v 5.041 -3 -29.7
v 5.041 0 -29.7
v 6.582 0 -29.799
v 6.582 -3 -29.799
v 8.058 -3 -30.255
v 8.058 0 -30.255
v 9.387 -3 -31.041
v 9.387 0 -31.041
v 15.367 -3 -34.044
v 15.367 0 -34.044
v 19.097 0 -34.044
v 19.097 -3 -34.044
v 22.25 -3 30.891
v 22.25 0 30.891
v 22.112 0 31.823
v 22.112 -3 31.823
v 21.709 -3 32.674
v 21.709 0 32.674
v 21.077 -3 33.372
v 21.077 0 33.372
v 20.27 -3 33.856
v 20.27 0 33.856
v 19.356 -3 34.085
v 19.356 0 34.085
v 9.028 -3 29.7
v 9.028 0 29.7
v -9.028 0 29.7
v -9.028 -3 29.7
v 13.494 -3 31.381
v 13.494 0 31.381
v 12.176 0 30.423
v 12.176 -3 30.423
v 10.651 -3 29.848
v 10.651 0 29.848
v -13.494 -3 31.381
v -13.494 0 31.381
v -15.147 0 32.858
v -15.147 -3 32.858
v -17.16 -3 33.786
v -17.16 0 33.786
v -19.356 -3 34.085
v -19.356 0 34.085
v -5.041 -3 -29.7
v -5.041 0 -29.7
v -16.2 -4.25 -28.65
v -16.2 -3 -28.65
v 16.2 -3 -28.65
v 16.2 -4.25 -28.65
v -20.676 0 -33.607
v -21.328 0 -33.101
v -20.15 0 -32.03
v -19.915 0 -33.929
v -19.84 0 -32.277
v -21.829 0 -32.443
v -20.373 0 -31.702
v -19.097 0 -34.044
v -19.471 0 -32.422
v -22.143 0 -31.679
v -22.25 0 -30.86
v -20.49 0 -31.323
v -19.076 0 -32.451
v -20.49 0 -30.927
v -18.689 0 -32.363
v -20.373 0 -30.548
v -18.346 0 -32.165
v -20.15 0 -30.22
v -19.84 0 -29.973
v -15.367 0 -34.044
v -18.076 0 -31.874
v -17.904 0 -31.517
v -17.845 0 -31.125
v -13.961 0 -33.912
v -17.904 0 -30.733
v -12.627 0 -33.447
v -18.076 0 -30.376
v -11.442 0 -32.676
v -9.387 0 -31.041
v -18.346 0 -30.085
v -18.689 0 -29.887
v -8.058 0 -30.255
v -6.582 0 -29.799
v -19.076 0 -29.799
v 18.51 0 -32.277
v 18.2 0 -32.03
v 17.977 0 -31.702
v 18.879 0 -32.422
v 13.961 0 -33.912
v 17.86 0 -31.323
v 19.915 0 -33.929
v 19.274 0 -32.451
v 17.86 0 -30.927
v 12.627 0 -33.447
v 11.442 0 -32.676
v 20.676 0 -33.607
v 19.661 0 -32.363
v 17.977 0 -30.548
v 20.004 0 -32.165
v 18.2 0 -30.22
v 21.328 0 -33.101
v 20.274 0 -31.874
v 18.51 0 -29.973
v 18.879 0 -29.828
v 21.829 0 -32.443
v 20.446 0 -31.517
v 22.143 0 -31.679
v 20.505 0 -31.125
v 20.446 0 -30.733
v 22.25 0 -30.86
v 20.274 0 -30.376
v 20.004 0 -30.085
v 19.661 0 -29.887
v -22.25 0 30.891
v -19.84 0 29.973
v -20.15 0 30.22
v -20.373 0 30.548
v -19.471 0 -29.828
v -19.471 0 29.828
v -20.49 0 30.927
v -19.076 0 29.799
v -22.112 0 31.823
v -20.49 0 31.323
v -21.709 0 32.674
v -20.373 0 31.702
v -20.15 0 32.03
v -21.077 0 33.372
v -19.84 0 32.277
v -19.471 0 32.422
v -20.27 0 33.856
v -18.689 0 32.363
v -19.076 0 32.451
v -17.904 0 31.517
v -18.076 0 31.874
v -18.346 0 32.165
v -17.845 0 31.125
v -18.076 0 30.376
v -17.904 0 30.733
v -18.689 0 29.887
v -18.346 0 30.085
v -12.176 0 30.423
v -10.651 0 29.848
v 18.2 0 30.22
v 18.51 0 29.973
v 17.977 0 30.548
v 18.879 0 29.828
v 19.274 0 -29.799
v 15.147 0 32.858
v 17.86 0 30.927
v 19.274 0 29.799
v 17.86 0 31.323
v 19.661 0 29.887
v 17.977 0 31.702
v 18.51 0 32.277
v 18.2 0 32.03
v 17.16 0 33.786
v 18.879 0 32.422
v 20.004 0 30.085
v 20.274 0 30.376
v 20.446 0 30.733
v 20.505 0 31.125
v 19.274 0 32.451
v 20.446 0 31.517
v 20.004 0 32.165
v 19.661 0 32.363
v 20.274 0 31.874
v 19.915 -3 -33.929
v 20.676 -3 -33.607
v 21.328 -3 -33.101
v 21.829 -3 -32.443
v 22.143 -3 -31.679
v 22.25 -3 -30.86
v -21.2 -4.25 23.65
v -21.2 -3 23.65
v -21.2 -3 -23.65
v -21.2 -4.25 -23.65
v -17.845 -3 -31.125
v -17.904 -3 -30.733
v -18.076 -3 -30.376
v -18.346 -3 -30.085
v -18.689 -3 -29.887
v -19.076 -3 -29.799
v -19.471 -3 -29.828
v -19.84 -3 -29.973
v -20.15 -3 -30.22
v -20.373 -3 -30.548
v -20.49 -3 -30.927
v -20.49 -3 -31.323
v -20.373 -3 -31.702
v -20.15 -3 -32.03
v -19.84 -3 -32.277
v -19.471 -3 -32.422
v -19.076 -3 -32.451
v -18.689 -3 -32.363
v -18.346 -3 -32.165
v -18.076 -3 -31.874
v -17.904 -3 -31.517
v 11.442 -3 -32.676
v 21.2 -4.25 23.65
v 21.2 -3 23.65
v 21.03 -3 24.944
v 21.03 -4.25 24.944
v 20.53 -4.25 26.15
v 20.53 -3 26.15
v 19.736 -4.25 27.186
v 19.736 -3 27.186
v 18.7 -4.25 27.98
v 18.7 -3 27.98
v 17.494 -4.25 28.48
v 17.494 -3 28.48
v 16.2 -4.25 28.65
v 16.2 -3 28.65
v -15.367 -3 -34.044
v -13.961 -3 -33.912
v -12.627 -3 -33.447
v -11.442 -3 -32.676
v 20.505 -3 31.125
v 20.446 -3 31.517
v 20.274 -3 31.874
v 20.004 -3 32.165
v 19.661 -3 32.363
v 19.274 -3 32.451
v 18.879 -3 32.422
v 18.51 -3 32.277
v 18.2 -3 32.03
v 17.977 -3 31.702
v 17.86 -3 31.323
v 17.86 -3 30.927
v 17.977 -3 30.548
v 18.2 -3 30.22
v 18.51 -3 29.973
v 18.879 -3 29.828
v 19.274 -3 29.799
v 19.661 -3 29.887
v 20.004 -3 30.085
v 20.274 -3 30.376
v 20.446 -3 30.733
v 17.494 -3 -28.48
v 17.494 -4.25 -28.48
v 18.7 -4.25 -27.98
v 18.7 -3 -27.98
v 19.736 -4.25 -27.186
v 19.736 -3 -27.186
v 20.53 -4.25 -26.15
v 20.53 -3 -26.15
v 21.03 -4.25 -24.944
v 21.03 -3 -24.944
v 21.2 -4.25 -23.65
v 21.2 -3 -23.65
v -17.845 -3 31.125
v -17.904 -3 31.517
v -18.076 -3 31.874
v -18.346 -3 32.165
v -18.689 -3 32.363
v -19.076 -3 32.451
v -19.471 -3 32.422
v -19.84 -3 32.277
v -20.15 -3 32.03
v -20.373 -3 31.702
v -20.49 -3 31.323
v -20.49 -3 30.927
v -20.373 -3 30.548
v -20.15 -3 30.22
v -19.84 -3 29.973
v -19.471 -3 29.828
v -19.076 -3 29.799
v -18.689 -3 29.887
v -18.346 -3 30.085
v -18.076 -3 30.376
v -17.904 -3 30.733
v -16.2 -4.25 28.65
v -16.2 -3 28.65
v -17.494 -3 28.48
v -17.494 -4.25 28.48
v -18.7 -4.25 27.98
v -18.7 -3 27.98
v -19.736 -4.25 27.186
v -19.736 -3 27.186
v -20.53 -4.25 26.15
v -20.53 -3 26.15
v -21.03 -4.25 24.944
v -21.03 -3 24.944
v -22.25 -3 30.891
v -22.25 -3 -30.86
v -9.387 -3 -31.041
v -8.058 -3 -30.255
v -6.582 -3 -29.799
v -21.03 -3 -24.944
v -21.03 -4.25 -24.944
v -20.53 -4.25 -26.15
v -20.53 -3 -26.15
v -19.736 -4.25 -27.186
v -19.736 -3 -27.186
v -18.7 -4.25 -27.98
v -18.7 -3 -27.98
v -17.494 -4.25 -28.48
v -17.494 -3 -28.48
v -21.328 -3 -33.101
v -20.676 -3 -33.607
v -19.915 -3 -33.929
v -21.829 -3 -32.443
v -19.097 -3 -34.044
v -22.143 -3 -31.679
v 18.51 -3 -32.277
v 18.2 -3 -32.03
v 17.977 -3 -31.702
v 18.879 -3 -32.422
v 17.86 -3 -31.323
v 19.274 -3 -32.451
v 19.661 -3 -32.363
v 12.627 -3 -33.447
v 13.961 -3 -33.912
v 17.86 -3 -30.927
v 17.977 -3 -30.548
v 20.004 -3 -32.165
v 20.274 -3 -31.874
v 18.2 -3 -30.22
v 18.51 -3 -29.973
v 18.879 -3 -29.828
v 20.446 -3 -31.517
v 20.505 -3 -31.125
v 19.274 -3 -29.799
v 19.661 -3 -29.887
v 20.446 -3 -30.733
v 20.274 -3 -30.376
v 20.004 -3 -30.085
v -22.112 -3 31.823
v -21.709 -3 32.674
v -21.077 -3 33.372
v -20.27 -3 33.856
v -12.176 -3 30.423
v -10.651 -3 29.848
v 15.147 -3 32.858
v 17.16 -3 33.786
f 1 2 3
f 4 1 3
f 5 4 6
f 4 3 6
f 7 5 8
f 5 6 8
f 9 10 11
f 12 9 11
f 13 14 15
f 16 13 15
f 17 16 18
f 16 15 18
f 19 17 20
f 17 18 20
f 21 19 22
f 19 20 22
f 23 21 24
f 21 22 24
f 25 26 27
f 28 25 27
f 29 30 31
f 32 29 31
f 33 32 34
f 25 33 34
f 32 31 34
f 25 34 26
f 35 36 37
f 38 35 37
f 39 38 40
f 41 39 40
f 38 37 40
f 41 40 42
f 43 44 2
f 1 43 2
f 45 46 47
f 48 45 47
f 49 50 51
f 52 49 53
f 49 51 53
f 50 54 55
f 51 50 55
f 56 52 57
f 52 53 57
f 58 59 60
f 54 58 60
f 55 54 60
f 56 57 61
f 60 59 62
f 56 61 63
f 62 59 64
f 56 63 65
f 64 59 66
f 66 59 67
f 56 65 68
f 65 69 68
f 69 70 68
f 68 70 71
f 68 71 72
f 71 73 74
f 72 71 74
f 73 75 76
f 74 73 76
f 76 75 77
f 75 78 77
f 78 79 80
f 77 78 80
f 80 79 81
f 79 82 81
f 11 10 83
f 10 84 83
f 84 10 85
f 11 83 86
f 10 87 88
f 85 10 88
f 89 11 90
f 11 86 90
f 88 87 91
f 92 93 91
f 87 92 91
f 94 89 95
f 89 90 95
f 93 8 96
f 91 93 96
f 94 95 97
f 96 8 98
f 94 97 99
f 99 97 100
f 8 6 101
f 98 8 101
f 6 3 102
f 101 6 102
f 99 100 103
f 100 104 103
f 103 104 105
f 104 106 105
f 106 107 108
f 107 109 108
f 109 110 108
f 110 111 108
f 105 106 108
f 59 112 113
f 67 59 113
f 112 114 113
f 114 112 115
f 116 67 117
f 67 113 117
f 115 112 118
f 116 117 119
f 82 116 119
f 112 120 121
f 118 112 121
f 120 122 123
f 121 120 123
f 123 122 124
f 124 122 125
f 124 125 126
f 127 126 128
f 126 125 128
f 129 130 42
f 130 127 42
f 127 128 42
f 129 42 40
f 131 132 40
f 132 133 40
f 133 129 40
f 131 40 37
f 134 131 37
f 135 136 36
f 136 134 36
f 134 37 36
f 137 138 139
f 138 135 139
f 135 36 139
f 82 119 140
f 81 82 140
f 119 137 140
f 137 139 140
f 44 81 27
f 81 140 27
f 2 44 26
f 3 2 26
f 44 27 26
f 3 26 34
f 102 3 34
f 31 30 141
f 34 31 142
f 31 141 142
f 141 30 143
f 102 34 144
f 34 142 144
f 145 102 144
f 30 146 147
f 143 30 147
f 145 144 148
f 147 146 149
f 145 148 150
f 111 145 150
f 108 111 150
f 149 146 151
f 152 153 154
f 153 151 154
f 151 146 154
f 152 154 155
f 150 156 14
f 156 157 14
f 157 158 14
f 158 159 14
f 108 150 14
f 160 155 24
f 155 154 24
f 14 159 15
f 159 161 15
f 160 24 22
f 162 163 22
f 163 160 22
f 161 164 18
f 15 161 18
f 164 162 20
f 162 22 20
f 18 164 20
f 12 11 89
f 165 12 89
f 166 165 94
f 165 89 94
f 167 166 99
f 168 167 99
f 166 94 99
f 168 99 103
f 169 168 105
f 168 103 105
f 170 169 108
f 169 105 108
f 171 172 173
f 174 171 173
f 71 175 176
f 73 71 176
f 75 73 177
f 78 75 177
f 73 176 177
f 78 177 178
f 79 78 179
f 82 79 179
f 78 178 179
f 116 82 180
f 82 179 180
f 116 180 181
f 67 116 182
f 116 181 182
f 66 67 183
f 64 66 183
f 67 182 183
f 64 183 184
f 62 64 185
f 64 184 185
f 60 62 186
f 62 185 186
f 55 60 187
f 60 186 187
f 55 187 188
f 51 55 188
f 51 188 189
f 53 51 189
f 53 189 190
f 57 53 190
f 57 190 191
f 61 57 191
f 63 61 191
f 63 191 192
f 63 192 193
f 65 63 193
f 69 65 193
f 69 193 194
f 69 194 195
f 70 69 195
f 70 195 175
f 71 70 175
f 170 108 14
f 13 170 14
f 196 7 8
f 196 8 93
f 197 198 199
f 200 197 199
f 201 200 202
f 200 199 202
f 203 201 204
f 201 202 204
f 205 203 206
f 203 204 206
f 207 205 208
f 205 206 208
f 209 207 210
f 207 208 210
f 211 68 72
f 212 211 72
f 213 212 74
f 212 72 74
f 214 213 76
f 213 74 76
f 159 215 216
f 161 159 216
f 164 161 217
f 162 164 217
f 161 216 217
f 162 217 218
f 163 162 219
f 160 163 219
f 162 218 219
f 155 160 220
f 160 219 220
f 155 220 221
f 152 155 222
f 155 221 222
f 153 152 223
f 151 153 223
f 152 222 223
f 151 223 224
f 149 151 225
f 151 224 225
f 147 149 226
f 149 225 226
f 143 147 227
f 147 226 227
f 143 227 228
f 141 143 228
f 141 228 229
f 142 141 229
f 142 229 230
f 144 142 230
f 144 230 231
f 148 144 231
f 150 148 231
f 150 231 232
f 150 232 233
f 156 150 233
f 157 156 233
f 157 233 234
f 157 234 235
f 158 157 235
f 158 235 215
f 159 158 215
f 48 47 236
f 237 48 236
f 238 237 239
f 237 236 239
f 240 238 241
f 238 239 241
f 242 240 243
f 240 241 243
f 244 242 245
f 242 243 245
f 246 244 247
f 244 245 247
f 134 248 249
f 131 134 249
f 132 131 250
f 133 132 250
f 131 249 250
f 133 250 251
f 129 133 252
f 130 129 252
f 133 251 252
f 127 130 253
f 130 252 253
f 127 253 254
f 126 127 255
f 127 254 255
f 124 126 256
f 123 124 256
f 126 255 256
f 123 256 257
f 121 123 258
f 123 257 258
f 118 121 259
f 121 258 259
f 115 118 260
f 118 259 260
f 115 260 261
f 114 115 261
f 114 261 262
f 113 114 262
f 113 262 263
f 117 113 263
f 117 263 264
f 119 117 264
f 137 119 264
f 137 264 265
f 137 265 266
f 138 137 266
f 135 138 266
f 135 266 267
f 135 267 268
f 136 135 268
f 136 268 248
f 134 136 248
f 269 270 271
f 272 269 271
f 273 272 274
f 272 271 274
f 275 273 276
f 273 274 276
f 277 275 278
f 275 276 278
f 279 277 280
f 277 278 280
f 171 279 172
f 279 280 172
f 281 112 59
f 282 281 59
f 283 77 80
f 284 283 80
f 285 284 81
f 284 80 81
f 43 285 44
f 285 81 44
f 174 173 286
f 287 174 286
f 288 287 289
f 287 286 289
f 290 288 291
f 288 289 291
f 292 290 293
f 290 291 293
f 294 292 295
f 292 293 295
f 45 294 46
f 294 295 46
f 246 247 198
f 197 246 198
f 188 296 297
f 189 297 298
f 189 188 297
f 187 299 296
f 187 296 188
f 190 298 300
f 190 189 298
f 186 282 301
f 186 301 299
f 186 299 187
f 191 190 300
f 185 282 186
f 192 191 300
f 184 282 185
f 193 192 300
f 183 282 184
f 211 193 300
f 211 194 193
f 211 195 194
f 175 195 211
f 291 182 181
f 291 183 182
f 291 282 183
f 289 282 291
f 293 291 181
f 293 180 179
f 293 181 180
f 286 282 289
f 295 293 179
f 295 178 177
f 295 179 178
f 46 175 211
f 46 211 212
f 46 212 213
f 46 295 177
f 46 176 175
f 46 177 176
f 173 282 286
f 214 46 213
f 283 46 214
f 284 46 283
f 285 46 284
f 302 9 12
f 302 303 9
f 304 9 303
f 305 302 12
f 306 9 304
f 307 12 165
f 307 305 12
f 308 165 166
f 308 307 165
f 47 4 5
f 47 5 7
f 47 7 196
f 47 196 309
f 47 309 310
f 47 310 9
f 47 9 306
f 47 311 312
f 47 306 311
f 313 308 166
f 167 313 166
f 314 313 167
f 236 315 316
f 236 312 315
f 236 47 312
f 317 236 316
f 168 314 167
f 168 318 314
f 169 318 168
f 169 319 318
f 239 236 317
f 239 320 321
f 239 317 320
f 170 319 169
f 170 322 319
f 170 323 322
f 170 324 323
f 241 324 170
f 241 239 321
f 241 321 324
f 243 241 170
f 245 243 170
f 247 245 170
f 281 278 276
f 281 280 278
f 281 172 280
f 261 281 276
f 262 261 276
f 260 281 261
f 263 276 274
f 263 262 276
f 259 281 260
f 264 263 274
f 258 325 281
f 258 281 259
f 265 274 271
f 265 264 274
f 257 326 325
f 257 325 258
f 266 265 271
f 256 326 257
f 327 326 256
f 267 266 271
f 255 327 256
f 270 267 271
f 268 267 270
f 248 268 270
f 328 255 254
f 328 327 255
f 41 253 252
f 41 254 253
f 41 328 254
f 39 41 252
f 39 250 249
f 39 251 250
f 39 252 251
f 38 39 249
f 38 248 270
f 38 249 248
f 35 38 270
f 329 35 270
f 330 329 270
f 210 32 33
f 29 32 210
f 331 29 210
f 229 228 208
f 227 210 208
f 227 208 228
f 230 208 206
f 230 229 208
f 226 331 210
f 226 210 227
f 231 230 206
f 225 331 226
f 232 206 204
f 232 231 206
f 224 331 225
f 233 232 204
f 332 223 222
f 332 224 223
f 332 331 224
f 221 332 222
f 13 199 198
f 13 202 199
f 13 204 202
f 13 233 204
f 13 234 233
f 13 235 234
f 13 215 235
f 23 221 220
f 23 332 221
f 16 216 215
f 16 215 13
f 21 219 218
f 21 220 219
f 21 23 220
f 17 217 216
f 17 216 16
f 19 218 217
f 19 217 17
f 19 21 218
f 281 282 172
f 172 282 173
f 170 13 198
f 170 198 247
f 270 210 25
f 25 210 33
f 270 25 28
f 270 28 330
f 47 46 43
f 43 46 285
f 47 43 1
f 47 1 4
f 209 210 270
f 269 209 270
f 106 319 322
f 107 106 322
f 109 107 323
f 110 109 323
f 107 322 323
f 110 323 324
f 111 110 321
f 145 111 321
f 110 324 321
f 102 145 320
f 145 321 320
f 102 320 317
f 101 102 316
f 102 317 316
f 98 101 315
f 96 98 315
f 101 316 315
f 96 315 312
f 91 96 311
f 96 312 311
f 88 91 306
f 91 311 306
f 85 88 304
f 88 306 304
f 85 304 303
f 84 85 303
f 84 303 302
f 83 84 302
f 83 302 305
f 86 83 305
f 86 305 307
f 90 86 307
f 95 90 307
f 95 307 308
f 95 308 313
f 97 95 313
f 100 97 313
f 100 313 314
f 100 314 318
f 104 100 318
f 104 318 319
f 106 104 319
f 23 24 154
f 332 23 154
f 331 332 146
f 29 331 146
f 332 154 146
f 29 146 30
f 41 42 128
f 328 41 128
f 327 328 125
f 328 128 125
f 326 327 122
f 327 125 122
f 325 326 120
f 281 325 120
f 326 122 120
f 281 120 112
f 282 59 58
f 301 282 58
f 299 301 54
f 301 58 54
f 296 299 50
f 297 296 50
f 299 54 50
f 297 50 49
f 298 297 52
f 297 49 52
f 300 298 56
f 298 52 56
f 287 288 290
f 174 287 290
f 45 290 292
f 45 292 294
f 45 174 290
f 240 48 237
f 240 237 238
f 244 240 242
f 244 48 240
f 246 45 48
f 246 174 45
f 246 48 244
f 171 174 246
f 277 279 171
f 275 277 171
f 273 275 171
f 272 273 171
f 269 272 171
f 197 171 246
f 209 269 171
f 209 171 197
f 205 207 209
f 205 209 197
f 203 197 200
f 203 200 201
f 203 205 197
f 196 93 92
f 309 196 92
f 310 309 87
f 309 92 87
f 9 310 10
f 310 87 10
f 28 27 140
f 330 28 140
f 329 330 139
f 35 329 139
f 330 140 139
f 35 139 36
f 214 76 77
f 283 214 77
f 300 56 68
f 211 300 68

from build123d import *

# Parameters (mm, degrees)
F1_DEPTH = 3
F3_DEPTH = 1.25
F4_R     = 1.33
F5_DEPTH = 3.001


with BuildPart() as f1:
    # F0 (on Front) → F1 (new body)
    with BuildSketch(Plane.XZ):
        with BuildLine():
            ThreePointArc((-19.35648, 34.085312), (-21.41906, 33.046163), (-22.25, 30.891259))
            Line((-22.25, 30.891259), (-22.25, -30.860331))
            ThreePointArc((-22.25, -30.860331), (-21.32844, -33.100719), (-19.097213, -34.04424))
            Line((-19.097213, -34.04424), (-15.3672, -34.04424))
            ThreePointArc((-15.3672, -34.04424), (-13.279512, -33.719597), (-11.44242, -32.676084))
            Line((-11.44242, -32.676084), (-9.386582, -31.040758))
            ThreePointArc((-9.386582, -31.040758), (-7.333283, -29.983659), (-5.04129, -29.700344))
            Line((-5.04129, -29.700344), (0, -29.700344))
            Line((0, -29.700344), (5.04129, -29.700344))
            ThreePointArc((5.04129, -29.700344), (7.333283, -29.983659), (9.386582, -31.040758))
            Line((9.386582, -31.040758), (11.44242, -32.676084))
            ThreePointArc((11.44242, -32.676084), (13.279512, -33.719597), (15.3672, -34.04424))
            Line((15.3672, -34.04424), (19.097213, -34.04424))
            ThreePointArc((19.097213, -34.04424), (21.32844, -33.100719), (22.25, -30.860331))
            Line((22.25, -30.860331), (22.25, 30.891259))
            ThreePointArc((22.25, 30.891259), (21.41906, 33.046163), (19.35648, 34.085312))
            ThreePointArc((19.35648, 34.085312), (16.119272, 33.397026), (13.494445, 31.381204))
            ThreePointArc((13.494445, 31.381204), (11.432837, 30.084307), (9.027799, 29.699656))
            Line((9.027799, 29.699656), (0, 29.699656))
            Line((0, 29.699656), (-9.027799, 29.699656))
            ThreePointArc((-9.027799, 29.699656), (-11.432837, 30.084307), (-13.494445, 31.381204))
            ThreePointArc((-13.494445, 31.381204), (-16.119272, 33.397026), (-19.35648, 34.085312))
        make_face()
    extrude(amount=F1_DEPTH)

    # F2 (on face) → F3 (join)
    with BuildSketch(Plane.XZ.offset(3)):
        with BuildLine():
            Line((16.2, 28.65), (-16.2, 28.65))
            ThreePointArc((-16.2, 28.65), (-19.735534, 27.185534), (-21.2, 23.65))
            Line((-21.2, 23.65), (-21.2, -23.65))
            ThreePointArc((-21.2, -23.65), (-19.735534, -27.185534), (-16.2, -28.65))
            Line((-16.2, -28.65), (16.2, -28.65))
            ThreePointArc((16.2, -28.65), (19.735534, -27.185534), (21.2, -23.65))
            Line((21.2, -23.65), (21.2, 23.65))
            ThreePointArc((21.2, 23.65), (19.735534, 27.185534), (16.2, 28.65))
        make_face()
    extrude(amount=F3_DEPTH)

    # F4 (on face) → F5 (cut, through all)
    with BuildSketch(Plane.XZ.offset(3)):
        with Locations((-19.175, 31.125)):
            Circle(F4_R)
        with Locations((19.175, 31.125)):
            Circle(F4_R)
        with Locations((19.175, -31.125)):
            Circle(F4_R)
        with Locations((-19.175, -31.125)):
            Circle(F4_R)
    extrude(amount=-F5_DEPTH, mode=Mode.SUBTRACT)


solid = f1.part
